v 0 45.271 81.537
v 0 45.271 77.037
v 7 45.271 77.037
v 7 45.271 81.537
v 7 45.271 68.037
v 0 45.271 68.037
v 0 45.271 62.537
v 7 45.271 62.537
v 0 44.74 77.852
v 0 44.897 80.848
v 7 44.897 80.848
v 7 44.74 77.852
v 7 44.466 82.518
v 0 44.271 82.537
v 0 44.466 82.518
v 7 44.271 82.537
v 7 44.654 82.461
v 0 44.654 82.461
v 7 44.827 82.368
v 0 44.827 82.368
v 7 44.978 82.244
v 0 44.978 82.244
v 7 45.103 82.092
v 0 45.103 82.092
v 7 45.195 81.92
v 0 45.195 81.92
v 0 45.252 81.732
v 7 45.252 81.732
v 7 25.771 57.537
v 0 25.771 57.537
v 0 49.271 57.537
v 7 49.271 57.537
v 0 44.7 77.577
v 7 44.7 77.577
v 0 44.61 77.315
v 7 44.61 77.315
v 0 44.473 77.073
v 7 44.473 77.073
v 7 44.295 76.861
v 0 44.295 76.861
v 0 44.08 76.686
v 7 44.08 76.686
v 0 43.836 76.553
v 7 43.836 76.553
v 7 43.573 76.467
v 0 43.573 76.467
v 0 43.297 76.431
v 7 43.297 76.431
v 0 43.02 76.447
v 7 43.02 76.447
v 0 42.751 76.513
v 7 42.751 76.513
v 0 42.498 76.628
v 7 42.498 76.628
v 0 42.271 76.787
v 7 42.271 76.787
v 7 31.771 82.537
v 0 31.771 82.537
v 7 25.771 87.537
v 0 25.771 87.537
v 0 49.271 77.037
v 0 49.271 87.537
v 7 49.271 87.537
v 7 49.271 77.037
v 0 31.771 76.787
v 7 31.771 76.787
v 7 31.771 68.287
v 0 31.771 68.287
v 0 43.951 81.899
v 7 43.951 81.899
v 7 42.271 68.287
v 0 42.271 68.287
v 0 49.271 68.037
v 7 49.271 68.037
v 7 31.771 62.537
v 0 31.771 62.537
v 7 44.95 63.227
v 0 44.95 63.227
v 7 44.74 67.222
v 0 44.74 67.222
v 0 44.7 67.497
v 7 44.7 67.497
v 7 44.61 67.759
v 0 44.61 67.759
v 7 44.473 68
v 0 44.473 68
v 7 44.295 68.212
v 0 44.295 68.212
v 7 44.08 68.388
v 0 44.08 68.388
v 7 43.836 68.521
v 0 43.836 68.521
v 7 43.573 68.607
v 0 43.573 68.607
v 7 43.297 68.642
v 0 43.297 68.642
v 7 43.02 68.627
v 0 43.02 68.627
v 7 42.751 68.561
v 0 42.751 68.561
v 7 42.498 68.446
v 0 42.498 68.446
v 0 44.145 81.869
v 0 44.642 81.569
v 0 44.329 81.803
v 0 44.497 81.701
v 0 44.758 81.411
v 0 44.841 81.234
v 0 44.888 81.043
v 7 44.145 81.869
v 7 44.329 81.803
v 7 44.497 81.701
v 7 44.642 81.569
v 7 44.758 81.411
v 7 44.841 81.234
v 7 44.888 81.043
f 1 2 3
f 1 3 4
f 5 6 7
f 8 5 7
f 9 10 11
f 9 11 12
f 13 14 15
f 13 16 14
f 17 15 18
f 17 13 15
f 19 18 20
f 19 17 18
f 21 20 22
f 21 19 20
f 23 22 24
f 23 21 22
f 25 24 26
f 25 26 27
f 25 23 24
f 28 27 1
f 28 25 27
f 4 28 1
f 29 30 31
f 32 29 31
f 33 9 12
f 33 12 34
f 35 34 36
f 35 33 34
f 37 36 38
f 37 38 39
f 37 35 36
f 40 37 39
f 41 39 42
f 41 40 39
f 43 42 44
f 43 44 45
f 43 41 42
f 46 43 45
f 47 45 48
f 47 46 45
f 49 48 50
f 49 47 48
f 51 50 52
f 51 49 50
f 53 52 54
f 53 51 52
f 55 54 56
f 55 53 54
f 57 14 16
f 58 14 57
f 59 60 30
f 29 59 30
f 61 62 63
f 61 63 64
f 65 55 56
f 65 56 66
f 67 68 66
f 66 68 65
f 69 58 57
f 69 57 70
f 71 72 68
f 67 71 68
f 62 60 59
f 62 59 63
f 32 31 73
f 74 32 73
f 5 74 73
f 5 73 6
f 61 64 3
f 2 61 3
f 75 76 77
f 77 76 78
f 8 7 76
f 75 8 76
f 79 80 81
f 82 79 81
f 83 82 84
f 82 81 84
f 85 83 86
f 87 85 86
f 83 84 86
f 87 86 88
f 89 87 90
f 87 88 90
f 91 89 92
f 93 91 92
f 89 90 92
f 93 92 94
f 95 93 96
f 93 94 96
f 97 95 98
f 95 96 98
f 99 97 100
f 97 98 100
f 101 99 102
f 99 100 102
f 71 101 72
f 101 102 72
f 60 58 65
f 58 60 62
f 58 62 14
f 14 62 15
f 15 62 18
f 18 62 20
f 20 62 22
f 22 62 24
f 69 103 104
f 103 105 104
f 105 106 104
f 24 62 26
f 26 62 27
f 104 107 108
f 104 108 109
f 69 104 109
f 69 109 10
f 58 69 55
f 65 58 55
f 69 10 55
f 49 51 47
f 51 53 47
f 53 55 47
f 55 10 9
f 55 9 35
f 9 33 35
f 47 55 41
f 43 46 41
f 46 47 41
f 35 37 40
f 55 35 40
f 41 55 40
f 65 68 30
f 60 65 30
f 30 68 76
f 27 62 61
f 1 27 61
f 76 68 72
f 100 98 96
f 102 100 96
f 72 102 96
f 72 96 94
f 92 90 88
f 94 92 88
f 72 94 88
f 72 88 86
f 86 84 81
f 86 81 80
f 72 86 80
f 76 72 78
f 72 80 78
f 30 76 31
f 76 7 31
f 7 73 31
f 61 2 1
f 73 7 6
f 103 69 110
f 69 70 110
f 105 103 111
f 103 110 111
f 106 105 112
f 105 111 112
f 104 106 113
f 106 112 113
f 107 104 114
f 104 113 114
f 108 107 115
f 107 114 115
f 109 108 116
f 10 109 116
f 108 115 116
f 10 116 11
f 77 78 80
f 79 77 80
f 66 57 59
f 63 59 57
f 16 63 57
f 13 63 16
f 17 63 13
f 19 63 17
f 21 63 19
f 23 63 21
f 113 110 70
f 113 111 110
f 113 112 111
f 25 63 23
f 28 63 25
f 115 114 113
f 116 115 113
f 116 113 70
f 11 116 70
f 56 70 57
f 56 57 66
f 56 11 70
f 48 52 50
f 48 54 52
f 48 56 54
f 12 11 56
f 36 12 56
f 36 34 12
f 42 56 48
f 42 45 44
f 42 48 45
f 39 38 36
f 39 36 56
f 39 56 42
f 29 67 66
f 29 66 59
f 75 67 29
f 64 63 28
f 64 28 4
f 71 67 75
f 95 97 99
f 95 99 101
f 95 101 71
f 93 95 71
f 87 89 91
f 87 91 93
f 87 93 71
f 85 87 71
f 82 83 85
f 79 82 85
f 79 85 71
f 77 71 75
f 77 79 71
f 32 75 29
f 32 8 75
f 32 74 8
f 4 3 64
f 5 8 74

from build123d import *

# Parameters (mm, degrees)
BOSS_EXTRUDE2_DEPTH = 7
FILLET1_R           = 1
FILLET2_R           = 1


with BuildPart() as part:
    # Sketch4 → Boss-Extrude2 (new body)
    with BuildSketch(Plane(origin=(0, 0, 0), x_dir=(0, 0, -1), z_dir=(1, 0, 0))):
        with BuildLine():
            Line((-82.536856532, 31.771329741), (-81.846213718, 44.949579673))
            Line((-81.846213718, 44.949579673), (-77.851695579, 44.740235848))
            ThreePointArc((-77.851695579, 44.740235848), (-76.552846322, 43.836343889), (-76.786856532, 42.271329741))
            Line((-76.786856532, 42.271329741), (-76.786856532, 31.771329741))
            Line((-76.786856532, 31.771329741), (-72.536856532, 31.771329741))
            Line((-72.536856532, 31.771329741), (-72.536856532, 25.771329741))
            Line((-72.536856532, 25.771329741), (-87.536856532, 25.771329741))
            Line((-87.536856532, 25.771329741), (-87.536856532, 49.271329741))
            Line((-87.536856532, 49.271329741), (-77.036856532, 49.271329741))
            Line((-77.036856532, 49.271329741), (-77.036856532, 45.271329741))
            Line((-77.036856532, 45.271329741), (-82.536856532, 45.271329741))
            Line((-82.536856532, 45.271329741), (-82.536856532, 31.771329741))
        make_face()
    boss_extrude2 = extrude(amount=BOSS_EXTRUDE2_DEPTH)

    # Fillet1
    fillet1_edges = [part.edges().sort_by_distance(p)[0] for p in [
        (3.5, 44.949579673, 81.846213718),
    ]]
    fillet(fillet1_edges, radius=FILLET1_R)

    # Fillet2
    fillet2_edges = [part.edges().sort_by_distance(p)[0] for p in [
        (3.5, 45.271329741, 82.536856532),
    ]]
    fillet(fillet2_edges, radius=FILLET2_R)

    # Mirror2: Boss-Extrude2 across plane
    add(boss_extrude2.mirror(Plane(origin=(7, 31.771329741, 72.536856532), x_dir=(1, 0, 0), z_dir=(0, 0, 1))))


solid = part.part
